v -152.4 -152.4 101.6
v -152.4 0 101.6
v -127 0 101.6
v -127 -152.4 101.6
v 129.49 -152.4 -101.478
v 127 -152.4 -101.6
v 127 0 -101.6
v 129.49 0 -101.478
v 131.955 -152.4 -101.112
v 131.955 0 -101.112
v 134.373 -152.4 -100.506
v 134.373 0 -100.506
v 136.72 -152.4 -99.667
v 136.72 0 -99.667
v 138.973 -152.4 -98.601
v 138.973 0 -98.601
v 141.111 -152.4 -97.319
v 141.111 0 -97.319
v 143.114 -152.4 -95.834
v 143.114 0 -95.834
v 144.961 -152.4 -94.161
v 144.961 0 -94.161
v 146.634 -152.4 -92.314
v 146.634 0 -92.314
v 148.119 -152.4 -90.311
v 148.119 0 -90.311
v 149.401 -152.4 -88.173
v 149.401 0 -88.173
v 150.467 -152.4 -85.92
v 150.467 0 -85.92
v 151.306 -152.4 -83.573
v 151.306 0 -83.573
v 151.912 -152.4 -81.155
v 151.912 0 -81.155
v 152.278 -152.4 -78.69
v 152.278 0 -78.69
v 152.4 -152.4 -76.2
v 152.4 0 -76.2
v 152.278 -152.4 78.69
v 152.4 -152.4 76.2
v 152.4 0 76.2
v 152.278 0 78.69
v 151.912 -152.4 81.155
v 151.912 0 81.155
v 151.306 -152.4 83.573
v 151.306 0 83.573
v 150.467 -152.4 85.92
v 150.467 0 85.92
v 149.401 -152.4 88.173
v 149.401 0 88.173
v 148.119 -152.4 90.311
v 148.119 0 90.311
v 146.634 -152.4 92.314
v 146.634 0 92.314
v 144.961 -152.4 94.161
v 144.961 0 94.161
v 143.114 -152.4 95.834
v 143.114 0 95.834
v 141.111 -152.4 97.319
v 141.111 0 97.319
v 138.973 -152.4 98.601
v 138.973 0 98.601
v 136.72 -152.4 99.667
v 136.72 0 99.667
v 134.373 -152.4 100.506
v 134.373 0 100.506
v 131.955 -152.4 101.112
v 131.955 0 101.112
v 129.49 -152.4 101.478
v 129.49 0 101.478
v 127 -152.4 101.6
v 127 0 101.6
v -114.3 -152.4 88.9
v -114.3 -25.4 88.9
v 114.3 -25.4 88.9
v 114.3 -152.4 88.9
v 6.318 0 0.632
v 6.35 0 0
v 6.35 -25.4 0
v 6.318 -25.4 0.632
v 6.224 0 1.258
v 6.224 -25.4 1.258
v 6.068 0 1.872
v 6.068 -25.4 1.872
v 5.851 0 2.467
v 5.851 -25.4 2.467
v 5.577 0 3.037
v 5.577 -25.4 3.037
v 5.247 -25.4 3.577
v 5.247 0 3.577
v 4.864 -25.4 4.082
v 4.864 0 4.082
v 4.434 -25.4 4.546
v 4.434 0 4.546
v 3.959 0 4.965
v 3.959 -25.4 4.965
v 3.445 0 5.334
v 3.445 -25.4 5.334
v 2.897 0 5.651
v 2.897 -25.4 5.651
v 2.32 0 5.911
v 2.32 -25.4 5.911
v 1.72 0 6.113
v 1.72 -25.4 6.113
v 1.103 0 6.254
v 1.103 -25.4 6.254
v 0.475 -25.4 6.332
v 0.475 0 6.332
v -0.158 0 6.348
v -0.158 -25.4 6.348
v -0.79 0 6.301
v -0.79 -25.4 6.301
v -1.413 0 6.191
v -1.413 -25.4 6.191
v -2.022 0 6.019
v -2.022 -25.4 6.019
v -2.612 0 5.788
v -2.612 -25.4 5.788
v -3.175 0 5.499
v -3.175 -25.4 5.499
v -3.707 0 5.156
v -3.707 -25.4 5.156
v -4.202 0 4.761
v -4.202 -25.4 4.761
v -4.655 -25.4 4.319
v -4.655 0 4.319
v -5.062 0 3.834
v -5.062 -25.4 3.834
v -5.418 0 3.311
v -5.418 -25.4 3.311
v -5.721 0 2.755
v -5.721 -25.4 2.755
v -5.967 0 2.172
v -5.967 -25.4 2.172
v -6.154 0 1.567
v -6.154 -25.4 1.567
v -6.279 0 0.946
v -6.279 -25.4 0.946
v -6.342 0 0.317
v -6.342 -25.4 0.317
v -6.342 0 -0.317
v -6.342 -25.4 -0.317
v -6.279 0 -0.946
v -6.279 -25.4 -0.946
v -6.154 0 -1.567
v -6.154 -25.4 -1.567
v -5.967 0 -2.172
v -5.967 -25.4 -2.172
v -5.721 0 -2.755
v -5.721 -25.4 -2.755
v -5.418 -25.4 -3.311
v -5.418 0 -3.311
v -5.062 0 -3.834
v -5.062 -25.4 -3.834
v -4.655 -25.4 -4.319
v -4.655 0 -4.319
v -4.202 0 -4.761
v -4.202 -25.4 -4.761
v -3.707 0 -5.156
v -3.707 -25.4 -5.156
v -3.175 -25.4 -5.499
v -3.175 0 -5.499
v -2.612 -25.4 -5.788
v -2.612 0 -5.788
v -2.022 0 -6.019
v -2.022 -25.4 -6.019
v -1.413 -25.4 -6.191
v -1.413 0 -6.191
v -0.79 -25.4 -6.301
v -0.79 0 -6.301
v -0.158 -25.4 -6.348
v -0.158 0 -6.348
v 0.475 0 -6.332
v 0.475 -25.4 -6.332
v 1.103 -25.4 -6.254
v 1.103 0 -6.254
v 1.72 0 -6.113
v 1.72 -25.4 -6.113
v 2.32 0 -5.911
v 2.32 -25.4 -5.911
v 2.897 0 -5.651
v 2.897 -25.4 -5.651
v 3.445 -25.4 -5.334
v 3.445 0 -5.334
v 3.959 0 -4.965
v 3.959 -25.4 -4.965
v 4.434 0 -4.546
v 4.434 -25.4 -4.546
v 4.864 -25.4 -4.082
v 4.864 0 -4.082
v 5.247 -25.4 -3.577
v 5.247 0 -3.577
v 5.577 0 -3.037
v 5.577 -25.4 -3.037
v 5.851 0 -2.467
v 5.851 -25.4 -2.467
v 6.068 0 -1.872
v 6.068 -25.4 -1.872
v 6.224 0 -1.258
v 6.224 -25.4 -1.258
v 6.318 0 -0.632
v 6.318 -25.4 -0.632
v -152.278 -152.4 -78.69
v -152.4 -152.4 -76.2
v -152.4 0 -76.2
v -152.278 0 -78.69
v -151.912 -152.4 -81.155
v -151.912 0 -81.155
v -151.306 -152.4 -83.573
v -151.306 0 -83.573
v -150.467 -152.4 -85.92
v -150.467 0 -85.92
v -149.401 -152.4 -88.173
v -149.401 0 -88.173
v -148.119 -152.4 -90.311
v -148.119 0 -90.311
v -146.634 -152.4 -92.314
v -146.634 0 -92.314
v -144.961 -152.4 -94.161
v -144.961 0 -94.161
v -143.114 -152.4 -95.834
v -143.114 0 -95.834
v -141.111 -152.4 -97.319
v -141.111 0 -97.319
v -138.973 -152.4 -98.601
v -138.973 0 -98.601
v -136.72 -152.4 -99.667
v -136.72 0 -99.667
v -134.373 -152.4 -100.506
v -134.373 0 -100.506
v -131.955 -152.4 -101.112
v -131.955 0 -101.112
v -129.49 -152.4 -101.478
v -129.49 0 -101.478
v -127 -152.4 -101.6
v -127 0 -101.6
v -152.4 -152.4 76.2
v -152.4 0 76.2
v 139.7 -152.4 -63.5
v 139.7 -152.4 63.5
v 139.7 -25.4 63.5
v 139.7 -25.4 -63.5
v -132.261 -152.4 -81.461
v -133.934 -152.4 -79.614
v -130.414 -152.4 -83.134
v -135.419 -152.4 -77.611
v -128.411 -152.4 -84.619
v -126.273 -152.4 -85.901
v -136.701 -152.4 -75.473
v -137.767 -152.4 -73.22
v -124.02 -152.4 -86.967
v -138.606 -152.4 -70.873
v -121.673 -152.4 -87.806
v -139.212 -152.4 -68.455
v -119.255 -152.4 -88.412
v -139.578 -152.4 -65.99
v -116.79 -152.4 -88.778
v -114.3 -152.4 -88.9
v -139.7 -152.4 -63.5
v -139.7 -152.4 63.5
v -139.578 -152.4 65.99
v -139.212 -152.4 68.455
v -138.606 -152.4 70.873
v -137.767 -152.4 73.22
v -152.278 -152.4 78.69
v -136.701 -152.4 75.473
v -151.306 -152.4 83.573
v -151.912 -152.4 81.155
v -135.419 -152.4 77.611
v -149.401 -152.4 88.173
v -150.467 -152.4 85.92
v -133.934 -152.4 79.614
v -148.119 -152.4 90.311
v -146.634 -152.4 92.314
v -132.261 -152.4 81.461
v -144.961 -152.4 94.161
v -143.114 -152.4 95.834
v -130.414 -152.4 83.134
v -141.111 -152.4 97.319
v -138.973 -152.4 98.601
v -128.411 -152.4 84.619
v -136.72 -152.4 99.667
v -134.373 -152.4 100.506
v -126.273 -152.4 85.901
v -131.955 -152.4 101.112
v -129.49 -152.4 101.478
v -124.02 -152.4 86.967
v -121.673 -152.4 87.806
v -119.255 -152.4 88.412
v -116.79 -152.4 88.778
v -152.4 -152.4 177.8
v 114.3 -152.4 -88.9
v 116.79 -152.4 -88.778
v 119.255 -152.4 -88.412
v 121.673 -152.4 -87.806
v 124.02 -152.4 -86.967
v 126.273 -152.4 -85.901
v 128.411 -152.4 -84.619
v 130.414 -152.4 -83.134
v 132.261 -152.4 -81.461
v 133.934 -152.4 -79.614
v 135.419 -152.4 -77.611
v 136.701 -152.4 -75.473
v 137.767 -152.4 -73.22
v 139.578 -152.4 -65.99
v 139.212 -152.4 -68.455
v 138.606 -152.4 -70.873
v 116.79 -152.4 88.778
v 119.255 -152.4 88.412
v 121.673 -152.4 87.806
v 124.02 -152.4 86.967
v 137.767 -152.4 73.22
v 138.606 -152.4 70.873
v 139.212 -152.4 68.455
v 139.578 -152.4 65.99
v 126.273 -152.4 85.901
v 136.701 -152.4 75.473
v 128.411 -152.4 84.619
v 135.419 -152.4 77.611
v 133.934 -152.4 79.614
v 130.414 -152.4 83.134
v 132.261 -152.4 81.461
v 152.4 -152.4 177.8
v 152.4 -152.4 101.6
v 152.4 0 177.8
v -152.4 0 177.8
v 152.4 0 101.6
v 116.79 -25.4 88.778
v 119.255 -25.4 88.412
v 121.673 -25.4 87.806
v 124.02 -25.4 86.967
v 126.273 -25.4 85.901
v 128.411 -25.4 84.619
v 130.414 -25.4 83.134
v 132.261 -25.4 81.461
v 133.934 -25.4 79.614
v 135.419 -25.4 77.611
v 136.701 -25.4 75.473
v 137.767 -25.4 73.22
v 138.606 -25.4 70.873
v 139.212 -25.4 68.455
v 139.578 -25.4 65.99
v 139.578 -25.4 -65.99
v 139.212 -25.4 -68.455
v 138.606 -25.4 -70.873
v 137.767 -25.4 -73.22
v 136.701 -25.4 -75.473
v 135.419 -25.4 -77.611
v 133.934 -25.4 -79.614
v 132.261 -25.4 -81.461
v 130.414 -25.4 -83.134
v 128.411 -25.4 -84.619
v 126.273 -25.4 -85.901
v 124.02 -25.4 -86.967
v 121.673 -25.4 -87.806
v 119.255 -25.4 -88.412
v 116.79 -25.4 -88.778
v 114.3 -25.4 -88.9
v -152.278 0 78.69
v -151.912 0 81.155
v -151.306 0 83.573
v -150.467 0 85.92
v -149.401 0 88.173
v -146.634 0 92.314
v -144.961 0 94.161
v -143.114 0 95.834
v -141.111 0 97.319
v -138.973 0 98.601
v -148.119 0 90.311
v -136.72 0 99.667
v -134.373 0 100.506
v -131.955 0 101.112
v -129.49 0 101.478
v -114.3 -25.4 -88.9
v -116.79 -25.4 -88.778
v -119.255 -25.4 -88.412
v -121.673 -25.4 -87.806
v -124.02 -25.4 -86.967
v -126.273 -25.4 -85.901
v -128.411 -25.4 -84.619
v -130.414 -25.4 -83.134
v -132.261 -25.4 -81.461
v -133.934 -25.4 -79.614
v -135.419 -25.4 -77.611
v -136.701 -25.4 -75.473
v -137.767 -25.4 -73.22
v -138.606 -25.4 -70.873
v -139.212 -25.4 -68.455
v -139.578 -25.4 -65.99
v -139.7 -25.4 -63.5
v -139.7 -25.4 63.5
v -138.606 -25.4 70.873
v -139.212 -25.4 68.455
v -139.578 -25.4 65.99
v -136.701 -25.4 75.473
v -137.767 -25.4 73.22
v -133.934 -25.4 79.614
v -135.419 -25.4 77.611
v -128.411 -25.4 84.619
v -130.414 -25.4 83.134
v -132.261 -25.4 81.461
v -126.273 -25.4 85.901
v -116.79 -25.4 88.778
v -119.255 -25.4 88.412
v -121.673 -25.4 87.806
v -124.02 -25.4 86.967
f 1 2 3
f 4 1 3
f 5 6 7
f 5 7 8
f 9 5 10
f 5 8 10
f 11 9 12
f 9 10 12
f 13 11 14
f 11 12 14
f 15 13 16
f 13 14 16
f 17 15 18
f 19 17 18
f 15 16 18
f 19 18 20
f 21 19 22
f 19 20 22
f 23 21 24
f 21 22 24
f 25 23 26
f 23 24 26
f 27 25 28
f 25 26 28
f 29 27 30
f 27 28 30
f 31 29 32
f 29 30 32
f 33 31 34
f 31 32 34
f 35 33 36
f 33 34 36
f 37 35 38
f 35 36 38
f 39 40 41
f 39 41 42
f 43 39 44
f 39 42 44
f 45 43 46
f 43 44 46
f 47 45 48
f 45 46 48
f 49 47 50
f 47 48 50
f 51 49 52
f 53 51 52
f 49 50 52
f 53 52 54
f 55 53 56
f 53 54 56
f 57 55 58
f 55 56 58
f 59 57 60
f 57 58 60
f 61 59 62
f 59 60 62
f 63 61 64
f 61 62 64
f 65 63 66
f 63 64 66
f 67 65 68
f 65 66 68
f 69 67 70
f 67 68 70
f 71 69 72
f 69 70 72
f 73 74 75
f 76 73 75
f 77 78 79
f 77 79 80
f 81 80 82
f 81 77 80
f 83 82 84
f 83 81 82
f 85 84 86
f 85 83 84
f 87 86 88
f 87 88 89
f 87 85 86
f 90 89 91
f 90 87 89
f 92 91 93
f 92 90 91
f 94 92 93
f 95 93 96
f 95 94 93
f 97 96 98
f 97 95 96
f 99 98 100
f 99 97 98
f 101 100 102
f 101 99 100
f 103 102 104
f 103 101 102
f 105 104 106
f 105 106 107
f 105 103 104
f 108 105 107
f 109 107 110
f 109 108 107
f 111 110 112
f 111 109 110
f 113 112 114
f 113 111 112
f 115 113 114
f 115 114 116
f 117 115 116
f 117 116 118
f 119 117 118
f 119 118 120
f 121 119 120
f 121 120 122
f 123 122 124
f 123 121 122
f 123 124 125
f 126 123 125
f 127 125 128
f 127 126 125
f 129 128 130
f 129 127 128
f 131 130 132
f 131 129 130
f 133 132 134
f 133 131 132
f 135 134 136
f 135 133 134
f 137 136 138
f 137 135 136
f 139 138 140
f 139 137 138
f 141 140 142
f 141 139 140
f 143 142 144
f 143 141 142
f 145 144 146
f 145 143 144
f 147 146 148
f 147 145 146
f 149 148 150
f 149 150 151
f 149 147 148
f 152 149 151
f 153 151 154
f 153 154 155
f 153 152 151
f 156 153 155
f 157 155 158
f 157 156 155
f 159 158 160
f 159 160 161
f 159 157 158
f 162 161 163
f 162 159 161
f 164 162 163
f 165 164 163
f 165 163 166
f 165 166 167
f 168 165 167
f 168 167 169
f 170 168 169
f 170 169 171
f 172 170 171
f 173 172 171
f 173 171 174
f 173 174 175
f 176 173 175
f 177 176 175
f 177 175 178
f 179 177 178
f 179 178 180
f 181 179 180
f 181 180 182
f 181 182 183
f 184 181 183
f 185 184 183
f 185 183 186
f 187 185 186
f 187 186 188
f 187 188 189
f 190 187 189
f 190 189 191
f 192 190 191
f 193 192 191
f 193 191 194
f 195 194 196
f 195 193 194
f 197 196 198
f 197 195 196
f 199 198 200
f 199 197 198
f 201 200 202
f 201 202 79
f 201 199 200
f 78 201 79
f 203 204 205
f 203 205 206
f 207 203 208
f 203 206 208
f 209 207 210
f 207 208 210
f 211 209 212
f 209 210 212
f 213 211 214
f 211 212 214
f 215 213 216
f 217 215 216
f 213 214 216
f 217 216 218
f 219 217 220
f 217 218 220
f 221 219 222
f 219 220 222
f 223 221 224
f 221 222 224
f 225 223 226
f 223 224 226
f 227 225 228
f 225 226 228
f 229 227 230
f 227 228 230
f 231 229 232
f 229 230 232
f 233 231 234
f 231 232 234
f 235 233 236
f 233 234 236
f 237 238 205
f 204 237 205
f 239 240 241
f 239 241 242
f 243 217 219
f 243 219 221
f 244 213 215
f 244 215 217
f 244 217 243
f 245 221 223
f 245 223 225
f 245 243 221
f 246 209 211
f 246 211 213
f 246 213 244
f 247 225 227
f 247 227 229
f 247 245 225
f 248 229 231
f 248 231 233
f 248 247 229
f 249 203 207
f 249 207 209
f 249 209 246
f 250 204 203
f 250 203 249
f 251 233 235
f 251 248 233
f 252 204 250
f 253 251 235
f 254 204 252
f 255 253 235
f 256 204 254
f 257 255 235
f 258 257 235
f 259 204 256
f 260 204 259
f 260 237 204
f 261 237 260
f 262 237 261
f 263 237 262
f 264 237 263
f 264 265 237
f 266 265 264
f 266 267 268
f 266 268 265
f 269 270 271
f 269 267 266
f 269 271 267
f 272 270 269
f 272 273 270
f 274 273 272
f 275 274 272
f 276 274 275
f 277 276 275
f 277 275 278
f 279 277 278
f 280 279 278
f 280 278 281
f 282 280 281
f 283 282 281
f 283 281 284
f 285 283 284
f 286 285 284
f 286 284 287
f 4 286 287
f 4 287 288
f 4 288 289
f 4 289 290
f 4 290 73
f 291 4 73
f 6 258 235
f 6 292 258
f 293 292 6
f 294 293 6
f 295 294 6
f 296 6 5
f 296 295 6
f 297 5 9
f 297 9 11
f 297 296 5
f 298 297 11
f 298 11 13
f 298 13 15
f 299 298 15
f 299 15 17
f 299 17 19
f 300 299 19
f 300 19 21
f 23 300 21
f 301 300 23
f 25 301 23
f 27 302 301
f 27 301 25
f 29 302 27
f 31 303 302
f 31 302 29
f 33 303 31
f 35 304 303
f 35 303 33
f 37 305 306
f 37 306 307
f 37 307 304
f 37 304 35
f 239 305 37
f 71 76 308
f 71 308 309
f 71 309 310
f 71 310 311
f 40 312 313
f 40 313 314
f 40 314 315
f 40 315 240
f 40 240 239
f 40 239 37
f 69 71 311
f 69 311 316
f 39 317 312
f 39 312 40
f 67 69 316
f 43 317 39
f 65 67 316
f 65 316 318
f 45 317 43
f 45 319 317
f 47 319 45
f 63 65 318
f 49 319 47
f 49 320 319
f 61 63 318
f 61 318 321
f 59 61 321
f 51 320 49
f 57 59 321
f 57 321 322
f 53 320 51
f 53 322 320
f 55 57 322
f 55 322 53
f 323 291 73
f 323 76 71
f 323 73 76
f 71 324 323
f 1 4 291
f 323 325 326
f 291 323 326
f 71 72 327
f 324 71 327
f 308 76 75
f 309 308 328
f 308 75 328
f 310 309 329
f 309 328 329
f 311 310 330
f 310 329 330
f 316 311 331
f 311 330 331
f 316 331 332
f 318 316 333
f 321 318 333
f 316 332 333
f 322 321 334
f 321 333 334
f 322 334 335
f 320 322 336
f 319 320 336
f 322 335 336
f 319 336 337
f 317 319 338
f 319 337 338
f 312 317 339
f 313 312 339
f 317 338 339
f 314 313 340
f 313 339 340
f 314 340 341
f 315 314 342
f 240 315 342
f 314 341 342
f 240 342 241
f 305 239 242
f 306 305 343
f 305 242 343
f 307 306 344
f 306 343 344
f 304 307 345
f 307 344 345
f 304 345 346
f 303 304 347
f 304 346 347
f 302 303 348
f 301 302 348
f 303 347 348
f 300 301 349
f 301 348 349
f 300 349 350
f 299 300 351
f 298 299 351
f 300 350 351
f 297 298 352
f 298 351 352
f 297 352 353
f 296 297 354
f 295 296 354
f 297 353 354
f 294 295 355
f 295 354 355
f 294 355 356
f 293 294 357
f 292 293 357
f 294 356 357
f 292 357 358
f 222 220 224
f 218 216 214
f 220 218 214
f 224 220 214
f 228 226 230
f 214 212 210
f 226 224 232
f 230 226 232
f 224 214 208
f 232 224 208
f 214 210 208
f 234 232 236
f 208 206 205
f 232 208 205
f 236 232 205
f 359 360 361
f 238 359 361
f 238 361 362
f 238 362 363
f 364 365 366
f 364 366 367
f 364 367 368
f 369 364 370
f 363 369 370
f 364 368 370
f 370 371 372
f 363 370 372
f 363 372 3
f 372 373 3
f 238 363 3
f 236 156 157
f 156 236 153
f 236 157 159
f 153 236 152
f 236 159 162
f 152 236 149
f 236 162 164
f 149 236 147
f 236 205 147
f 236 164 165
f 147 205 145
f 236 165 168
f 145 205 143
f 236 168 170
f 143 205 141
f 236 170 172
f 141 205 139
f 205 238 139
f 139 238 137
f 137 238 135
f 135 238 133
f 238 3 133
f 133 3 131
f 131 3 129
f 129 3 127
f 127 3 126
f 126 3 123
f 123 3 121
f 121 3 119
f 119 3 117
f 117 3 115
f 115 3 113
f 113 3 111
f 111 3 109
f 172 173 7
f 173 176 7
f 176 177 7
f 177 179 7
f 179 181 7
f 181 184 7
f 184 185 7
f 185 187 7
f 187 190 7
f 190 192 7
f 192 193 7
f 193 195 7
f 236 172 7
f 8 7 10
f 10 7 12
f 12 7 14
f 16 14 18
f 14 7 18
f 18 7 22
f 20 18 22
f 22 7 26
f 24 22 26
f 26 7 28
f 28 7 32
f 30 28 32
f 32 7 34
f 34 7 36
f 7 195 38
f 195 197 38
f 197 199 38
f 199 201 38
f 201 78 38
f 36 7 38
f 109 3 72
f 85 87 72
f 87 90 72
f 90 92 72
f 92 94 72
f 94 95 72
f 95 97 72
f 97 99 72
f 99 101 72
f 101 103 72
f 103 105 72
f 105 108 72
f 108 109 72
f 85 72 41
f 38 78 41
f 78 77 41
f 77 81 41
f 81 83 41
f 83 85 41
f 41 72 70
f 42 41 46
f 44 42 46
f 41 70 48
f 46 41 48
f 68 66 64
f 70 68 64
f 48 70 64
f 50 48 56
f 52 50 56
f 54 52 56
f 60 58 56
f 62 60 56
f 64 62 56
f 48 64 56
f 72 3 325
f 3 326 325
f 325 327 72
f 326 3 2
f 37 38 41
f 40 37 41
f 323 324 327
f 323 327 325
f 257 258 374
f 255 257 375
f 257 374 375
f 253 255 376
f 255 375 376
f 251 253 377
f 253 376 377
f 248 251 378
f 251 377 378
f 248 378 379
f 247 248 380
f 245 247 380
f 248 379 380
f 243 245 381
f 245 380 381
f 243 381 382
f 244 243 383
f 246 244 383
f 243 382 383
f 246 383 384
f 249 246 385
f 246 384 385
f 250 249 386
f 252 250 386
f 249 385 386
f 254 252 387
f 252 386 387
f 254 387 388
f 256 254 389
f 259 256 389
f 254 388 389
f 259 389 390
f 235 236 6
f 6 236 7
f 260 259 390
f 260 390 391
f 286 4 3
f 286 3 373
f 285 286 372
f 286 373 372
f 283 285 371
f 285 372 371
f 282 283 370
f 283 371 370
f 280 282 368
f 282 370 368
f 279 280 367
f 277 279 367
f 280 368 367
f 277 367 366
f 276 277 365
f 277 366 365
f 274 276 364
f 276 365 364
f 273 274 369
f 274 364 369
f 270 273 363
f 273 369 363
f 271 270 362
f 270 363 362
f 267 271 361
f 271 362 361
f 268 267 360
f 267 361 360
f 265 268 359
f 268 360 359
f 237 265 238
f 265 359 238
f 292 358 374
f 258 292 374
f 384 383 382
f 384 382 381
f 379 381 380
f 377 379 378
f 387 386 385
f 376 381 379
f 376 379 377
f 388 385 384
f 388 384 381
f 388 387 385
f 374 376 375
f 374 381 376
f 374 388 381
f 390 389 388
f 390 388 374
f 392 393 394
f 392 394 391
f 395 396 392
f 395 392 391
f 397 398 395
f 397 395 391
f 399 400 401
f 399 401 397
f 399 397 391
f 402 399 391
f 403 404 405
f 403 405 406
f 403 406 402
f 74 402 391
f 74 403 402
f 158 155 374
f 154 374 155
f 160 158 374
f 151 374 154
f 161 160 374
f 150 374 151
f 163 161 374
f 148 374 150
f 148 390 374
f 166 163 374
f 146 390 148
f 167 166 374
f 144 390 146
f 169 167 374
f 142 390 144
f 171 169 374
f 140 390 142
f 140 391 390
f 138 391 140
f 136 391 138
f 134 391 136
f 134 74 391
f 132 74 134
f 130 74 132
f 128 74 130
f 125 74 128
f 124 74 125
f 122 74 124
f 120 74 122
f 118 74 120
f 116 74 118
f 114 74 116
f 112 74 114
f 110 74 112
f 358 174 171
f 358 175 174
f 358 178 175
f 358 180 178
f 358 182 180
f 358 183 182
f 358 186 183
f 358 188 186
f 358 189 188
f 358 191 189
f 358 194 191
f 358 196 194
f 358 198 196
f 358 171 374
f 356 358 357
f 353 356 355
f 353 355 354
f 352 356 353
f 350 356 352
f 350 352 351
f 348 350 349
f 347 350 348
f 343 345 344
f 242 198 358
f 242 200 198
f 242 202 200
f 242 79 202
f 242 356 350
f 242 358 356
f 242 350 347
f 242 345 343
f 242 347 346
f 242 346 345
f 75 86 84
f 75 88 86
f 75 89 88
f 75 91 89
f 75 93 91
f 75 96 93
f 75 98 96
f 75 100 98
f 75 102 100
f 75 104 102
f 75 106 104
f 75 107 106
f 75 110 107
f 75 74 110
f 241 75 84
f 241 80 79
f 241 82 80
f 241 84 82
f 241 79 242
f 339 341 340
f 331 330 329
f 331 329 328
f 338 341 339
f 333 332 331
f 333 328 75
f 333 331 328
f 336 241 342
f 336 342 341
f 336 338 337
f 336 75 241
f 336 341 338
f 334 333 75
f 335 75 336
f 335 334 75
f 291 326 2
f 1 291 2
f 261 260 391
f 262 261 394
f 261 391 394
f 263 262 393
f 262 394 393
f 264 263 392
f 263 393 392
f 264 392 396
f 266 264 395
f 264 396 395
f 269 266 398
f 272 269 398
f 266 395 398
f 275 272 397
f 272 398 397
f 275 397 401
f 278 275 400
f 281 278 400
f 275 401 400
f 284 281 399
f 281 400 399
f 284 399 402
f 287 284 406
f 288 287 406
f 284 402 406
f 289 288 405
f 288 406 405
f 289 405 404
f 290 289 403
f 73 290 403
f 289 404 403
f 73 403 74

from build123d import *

# Parameters (mm, degrees)
F1_DEPTH = 25.4
F0_R     = 6.35
F2_DEPTH = 152.4
F0_W     = 152.4
F0_H     = 38.1
F3_DEPTH = 152.4


with BuildPart() as f1:
    # F0 (on Front) → F1 (new body)
    with BuildSketch(Plane.XZ):
        Polygon((127, 101.6), (152.4, 101.6), (152.4, 139.7), (0, 139.7), (0, 101.6), align=None)
        Polygon((-127, 101.6), (0, 101.6), (0, 139.7), (-152.4, 139.7), (-152.4, 101.6), align=None)
    extrude(amount=F1_DEPTH)



with BuildPart() as f1b:
    # F0 (on Front) → F1, piece 2 (new body)
    with BuildSketch(Plane.XZ):
        with BuildLine():
            ThreePointArc((139.7, 63.5), (132.2605122421, 81.4605122421), (114.3, 88.9))
            Line((114.3, 88.9), (-114.3, 88.9))
            ThreePointArc((-114.3, 88.9), (-132.2605122421, 81.4605122421), (-139.7, 63.5))
            Line((-139.7, 63.5), (-139.7, -63.5))
            ThreePointArc((-139.7, -63.5), (-132.2605122421, -81.4605122421), (-114.3, -88.9))
            Line((-114.3, -88.9), (114.3, -88.9))
            ThreePointArc((114.3, -88.9), (132.2605122421, -81.4605122421), (139.7, -63.5))
            Line((139.7, -63.5), (139.7, 63.5))
        make_face()
        Circle(F0_R, mode=Mode.SUBTRACT)
    extrude(amount=F1_DEPTH)


with BuildPart() as f1_1:
    add(f1.part)

    add(f1b.part)  # F2 merges F1b
    # F0 (on Front) → F2 (join)
    with BuildSketch(Plane.XZ):
        Polygon((127, 101.6), (152.4, 101.6), (152.4, 139.7), (0, 139.7), (0, 101.6), align=None)
        with BuildLine():
            ThreePointArc((152.4, 76.2), (144.9605122421, 94.1605122421), (127, 101.6))
            Line((127, 101.6), (0, 101.6))
            Line((0, 101.6), (-127, 101.6))
            ThreePointArc((-127, 101.6), (-144.9605122421, 94.1605122421), (-152.4, 76.2))
            Line((-152.4, 76.2), (-152.4, -76.2))
            ThreePointArc((-152.4, -76.2), (-144.9605122421, -94.1605122421), (-127, -101.6))
            Line((-127, -101.6), (127, -101.6))
            ThreePointArc((127, -101.6), (144.9605122421, -94.1605122421), (152.4, -76.2))
            Line((152.4, -76.2), (152.4, 76.2))
        make_face()
        with BuildLine():
            Line((-114.3, 88.9), (114.3, 88.9))
            ThreePointArc((114.3, 88.9), (132.2605122421, 81.4605122421), (139.7, 63.5))
            Line((139.7, 63.5), (139.7, -63.5))
            ThreePointArc((139.7, -63.5), (132.2605122421, -81.4605122421), (114.3, -88.9))
            Line((114.3, -88.9), (-114.3, -88.9))
            ThreePointArc((-114.3, -88.9), (-132.2605122421, -81.4605122421), (-139.7, -63.5))
            Line((-139.7, -63.5), (-139.7, 63.5))
            ThreePointArc((-139.7, 63.5), (-132.2605122421, 81.4605122421), (-114.3, 88.9))
        make_face(mode=Mode.SUBTRACT)
        Polygon((-127, 101.6), (0, 101.6), (0, 139.7), (-152.4, 139.7), (-152.4, 101.6), align=None)
    extrude(amount=F2_DEPTH)

    # F0 (on Front) → F3 (join)
    with BuildSketch(Plane.XZ):
        with BuildLine():
            ThreePointArc((152.4, 76.2), (144.9605122421, 94.1605122421), (127, 101.6))
            Line((127, 101.6), (0, 101.6))
            Line((0, 101.6), (-127, 101.6))
            ThreePointArc((-127, 101.6), (-144.9605122421, 94.1605122421), (-152.4, 76.2))
            Line((-152.4, 76.2), (-152.4, -76.2))
            ThreePointArc((-152.4, -76.2), (-144.9605122421, -94.1605122421), (-127, -101.6))
            Line((-127, -101.6), (127, -101.6))
            ThreePointArc((127, -101.6), (144.9605122421, -94.1605122421), (152.4, -76.2))
            Line((152.4, -76.2), (152.4, 76.2))
        make_face()
        with BuildLine():
            Line((-114.3, 88.9), (114.3, 88.9))
            ThreePointArc((114.3, 88.9), (132.2605122421, 81.4605122421), (139.7, 63.5))
            Line((139.7, 63.5), (139.7, -63.5))
            ThreePointArc((139.7, -63.5), (132.2605122421, -81.4605122421), (114.3, -88.9))
            Line((114.3, -88.9), (-114.3, -88.9))
            ThreePointArc((-114.3, -88.9), (-132.2605122421, -81.4605122421), (-139.7, -63.5))
            Line((-139.7, -63.5), (-139.7, 63.5))
            ThreePointArc((-139.7, 63.5), (-132.2605122421, 81.4605122421), (-114.3, 88.9))
        make_face(mode=Mode.SUBTRACT)
        with Locations((-76.2, 158.75)):
            Rectangle(F0_W, F0_H)
        with Locations((76.2, 158.75)):
            Rectangle(F0_W, F0_H)
    extrude(amount=F3_DEPTH)


solid = f1_1.part
